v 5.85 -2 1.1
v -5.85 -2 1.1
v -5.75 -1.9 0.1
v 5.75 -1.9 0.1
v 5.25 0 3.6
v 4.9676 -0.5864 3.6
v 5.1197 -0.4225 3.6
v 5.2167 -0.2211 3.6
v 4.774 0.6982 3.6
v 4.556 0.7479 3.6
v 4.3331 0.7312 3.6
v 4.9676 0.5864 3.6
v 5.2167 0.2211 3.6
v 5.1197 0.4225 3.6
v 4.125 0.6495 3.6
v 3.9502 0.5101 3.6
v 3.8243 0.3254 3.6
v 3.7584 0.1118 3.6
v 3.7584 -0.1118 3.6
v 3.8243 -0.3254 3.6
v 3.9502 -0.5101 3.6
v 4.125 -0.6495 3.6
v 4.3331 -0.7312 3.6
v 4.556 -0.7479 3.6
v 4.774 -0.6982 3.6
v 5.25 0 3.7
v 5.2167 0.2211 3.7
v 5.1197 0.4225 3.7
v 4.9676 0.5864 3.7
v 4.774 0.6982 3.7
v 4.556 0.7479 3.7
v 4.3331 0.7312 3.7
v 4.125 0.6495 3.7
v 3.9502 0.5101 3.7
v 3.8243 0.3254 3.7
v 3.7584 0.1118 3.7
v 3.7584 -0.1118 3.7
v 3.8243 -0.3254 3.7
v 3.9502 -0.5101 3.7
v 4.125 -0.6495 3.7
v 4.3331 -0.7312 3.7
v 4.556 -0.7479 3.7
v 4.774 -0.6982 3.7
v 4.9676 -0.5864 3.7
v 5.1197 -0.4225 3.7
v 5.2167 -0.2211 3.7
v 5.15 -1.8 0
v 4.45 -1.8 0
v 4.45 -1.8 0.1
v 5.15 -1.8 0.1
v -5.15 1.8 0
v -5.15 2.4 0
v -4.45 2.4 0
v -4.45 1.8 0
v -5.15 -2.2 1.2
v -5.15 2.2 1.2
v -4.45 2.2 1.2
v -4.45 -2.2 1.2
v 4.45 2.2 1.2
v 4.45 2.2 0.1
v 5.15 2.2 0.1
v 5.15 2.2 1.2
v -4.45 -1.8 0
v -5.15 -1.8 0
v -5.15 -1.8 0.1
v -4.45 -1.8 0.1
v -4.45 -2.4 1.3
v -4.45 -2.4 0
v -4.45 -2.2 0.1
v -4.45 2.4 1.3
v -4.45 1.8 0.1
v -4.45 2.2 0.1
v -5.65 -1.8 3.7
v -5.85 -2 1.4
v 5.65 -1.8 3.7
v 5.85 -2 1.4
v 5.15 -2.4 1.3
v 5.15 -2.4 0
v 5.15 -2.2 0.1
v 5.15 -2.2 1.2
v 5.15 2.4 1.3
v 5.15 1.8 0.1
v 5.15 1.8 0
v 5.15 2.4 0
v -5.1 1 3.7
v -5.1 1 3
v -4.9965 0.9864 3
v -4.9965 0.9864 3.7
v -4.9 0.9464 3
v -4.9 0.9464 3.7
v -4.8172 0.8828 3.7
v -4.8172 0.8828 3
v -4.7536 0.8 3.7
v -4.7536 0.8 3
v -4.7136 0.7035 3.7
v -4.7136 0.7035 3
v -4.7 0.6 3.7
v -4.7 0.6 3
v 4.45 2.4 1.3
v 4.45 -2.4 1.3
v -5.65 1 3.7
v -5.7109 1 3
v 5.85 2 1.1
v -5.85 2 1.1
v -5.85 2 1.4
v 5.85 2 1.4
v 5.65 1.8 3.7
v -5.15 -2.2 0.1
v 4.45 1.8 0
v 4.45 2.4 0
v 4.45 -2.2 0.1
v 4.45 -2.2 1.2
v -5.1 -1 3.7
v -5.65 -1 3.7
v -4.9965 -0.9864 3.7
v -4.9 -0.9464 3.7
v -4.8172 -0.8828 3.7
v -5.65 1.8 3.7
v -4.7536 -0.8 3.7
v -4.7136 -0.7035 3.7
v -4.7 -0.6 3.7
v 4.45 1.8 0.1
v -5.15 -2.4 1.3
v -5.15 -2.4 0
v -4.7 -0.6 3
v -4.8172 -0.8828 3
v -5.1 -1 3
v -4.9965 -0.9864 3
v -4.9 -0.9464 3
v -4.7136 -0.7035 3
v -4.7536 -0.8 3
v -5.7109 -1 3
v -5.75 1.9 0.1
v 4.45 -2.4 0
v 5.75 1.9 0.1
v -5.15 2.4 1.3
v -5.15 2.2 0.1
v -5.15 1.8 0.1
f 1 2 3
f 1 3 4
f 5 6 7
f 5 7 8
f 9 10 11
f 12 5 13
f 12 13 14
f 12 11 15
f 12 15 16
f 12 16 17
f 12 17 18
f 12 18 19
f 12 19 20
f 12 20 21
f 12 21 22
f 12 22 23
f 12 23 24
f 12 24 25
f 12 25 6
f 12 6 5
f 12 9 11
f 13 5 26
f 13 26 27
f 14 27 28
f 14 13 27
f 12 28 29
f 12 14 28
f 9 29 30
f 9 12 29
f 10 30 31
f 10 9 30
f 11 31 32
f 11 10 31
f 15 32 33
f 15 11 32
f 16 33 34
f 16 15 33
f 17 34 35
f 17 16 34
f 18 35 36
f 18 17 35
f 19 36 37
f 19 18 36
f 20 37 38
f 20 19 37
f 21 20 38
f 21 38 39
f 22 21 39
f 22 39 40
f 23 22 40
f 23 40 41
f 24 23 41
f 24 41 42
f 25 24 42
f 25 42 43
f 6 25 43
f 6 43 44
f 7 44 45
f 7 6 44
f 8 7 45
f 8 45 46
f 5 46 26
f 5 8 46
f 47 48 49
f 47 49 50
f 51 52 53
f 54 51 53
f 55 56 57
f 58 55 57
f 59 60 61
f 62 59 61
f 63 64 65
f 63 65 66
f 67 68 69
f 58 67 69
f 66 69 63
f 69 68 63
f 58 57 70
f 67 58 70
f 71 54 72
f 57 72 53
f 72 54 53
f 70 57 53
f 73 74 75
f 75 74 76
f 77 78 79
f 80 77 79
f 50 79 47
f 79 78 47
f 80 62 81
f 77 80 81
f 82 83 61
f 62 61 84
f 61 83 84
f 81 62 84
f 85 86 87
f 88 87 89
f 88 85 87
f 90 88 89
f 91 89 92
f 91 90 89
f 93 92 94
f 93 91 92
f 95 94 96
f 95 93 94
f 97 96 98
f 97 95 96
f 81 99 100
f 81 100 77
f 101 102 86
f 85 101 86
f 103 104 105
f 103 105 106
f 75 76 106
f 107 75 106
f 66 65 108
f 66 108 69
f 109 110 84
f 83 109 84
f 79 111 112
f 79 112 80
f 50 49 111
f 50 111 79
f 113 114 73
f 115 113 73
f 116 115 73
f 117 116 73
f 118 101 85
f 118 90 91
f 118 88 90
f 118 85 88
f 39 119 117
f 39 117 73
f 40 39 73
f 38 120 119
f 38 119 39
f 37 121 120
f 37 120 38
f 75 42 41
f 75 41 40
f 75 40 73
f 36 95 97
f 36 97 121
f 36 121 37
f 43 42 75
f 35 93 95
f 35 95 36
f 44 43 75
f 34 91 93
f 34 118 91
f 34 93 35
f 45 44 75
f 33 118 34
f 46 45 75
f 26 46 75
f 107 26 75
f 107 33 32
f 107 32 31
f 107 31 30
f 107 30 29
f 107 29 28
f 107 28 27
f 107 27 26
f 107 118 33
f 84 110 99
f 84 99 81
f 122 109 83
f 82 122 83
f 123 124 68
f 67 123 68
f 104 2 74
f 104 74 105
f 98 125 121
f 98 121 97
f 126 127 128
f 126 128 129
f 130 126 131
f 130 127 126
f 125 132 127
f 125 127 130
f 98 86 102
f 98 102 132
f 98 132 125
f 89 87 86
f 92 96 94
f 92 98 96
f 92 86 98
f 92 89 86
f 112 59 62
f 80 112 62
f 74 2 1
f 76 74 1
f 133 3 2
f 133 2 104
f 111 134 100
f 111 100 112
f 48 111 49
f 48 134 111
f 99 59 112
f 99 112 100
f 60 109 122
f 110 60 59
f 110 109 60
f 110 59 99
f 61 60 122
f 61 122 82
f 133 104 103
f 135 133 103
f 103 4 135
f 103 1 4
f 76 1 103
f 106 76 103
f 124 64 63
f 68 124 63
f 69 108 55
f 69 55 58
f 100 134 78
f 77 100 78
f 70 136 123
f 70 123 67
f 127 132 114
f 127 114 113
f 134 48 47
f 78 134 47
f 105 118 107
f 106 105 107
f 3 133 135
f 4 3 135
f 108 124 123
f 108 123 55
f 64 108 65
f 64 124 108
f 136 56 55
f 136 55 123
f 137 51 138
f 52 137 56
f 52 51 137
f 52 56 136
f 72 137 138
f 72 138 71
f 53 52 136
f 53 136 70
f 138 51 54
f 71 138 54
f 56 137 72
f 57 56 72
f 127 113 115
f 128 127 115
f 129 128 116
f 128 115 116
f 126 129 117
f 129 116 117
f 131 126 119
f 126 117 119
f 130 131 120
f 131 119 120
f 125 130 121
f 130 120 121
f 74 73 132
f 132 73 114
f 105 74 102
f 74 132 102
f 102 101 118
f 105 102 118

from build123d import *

# Parameters (mm, degrees)
BOX003_W         = 2.7
BOX003_H         = 3.6
BOX003_DEPTH     = 1.1
BOX002_W         = 2.7
BOX002_H         = 4.4
BOX002_DEPTH     = 1.1
BOX_W            = 0.7
BOX_H            = 4.8
BOX_DEPTH        = 1.3
BOX005_W         = 2.7
BOX005_H         = 3.6
BOX005_DEPTH     = 1.1
BOX004_W         = 2.7
BOX004_H         = 4.4
BOX004_DEPTH     = 1.1
BOX001_W         = 0.7
BOX001_H         = 4.8
BOX001_DEPTH     = 1.3
BOX006_W         = 2
BOX006_H         = 2
BOX006_DEPTH     = 1
FILLET_R         = 0.4
FILLET001_R      = 0.4
FILLET002_R      = 0.4
CYLINDER_R       = 0.75
CYLINDER_DEPTH   = 1
SKETCH_W         = 11.7
SKETCH_H         = 4
PAD_DEPTH        = 3.6
CHAMFER_SIZE2    = 0.2
CHAMFER_SIZE     = 2.3
CHAMFER001_SIZE2 = 2.3
CHAMFER001_SIZE  = 0.2
CHAMFER002_SIZE2 = 0.2
CHAMFER002_SIZE  = 2.3
CHAMFER003_SIZE2 = 2.3
CHAMFER003_SIZE  = 0.2
CHAMFER004_SIZE2 = 0.1
CHAMFER004_SIZE  = 1
CHAMFER005_SIZE2 = 1
CHAMFER005_SIZE  = 0.1
CHAMFER006_SIZE2 = 1
CHAMFER006_SIZE  = 0.1
CHAMFER007_SIZE2 = 1
CHAMFER007_SIZE  = 0.1


with BuildPart() as kub003:
    # Box003 → Box003 (new body)
    with BuildSketch(Plane(origin=(3.45, -1.8, -0.9), x_dir=(1, 0, 0), z_dir=(0, 0, 1))):
        with Locations((1.35, 1.8)):
            Rectangle(BOX003_W, BOX003_H)
    extrude(amount=BOX003_DEPTH)


with BuildPart() as kub002:
    # Box002 → Box002 (new body)
    with BuildSketch(Plane(origin=(3.45, -2.2, 0.1), x_dir=(1, 0, 0), z_dir=(0, 0, 1))):
        with Locations((1.35, 2.2)):
            Rectangle(BOX002_W, BOX002_H)
    extrude(amount=BOX002_DEPTH)


with BuildPart() as cut001:
    # Box → Box (new body)
    with BuildSketch(Plane(origin=(4.45, -2.4, 0), x_dir=(1, 0, 0), z_dir=(0, 0, 1))):
        with Locations((0.35, 2.4)):
            Rectangle(BOX_W, BOX_H)
    extrude(amount=BOX_DEPTH)

    # Cut: cut Kub002
    add(kub002.part, mode=Mode.SUBTRACT)

    # Cut001: cut Kub003
    add(kub003.part, mode=Mode.SUBTRACT)


with BuildPart() as kub005:
    # Box005 → Box005 (new body)
    with BuildSketch(Plane(origin=(-6.55, -1.8, -0.9), x_dir=(1, 0, 0), z_dir=(0, 0, 1))):
        with Locations((1.35, 1.8)):
            Rectangle(BOX005_W, BOX005_H)
    extrude(amount=BOX005_DEPTH)


with BuildPart() as kub004:
    # Box004 → Box004 (new body)
    with BuildSketch(Plane(origin=(-5.55, -2.2, 0.1), x_dir=(1, 0, 0), z_dir=(0, 0, 1))):
        with Locations((1.35, 2.2)):
            Rectangle(BOX004_W, BOX004_H)
    extrude(amount=BOX004_DEPTH)


with BuildPart() as cut003:
    # Box001 → Box001 (new body)
    with BuildSketch(Plane(origin=(-5.15, -2.4, 0), x_dir=(1, 0, 0), z_dir=(0, 0, 1))):
        with Locations((0.35, 2.4)):
            Rectangle(BOX001_W, BOX001_H)
    extrude(amount=BOX001_DEPTH)

    # Cut002: cut Kub004
    add(kub004.part, mode=Mode.SUBTRACT)

    # Cut003: cut Kub005
    add(kub005.part, mode=Mode.SUBTRACT)


with BuildPart() as fillet002:
    # Box006 → Box006 (new body)
    with BuildSketch(Plane(origin=(5, -1, 3), x_dir=(1, 0, 0), z_dir=(0, 0, 1))):
        with Locations((1, 1)):
            Rectangle(BOX006_W, BOX006_H)
    extrude(amount=BOX006_DEPTH)

    # Fillet
    fillet_edges = [fillet002.edges().sort_by_distance(p)[0] for p in [
        (5, -1, 3.5),
    ]]
    fillet(fillet_edges, radius=FILLET_R)

    # Fillet001
    fillet001_edges = [fillet002.edges().sort_by_distance(p)[0] for p in [
        (5, 1, 3.5),
    ]]
    fillet(fillet001_edges, radius=FILLET001_R)

    # Fillet002
    fillet002_edges = [fillet002.edges().sort_by_distance(p)[0] for p in [
        (7, 1, 3.5),
        (7, -1, 3.5),
    ]]
    fillet(fillet002_edges, radius=FILLET002_R)


with BuildPart() as fillet002_1:
    # Fillet002 placement: moved
    add(fillet002.part.moved(Location((-11.7, 0, 0))))


with BuildPart() as cylinder:
    # Cylinder → Cylinder (new body)
    with BuildSketch(Plane(origin=(4.5, 0, 3.6), x_dir=(1, 0, 0), z_dir=(0, 0, 1))):
        Circle(CYLINDER_R)
    extrude(amount=CYLINDER_DEPTH)


with BuildPart() as cut005:
    # Sketch → Pad (new body)
    with BuildSketch(Plane.XY):
        Rectangle(SKETCH_W, SKETCH_H)
    extrude(amount=PAD_DEPTH)


with BuildPart() as cut005_1:
    # Body placement: moved
    add(cut005.part.moved(Location((0, 0, 0.1))))

    # Cut004: cut Cylinder
    add(cylinder.part, mode=Mode.SUBTRACT)

    # Chamfer
    chamfer_edges = [cut005_1.edges().sort_by_distance(p)[0] for p in [
        (0, 2, 3.7),
    ]]
    chamfer_side = cut005_1.faces().sort_by_distance((0, 2, 1.9))[0]
    chamfer(chamfer_edges, length=CHAMFER_SIZE, length2=CHAMFER_SIZE2, reference=chamfer_side)

    # Chamfer001
    chamfer001_edges = [cut005_1.edges().sort_by_distance(p)[0] for p in [
        (0, -2, 3.7),
    ]]
    chamfer001_side = cut005_1.faces().sort_by_distance((-0.186264, -0.104139, 3.7))[0]
    chamfer(chamfer001_edges, length=CHAMFER001_SIZE, length2=CHAMFER001_SIZE2, reference=chamfer001_side)

    # Chamfer002
    chamfer002_edges = [cut005_1.edges().sort_by_distance(p)[0] for p in [
        (-5.85, 0, 3.7),
    ]]
    chamfer002_side = cut005_1.faces().sort_by_distance((-5.85, 0, 1.865901))[0]
    chamfer(chamfer002_edges, length=CHAMFER002_SIZE, length2=CHAMFER002_SIZE2, reference=chamfer002_side)

    # Chamfer003
    chamfer003_edges = [cut005_1.edges().sort_by_distance(p)[0] for p in [
        (5.85, 0, 3.7),
    ]]
    chamfer003_side = cut005_1.faces().sort_by_distance((-0.096187, 0, 3.7))[0]
    chamfer(chamfer003_edges, length=CHAMFER003_SIZE, length2=CHAMFER003_SIZE2, reference=chamfer003_side)

    # Chamfer004
    chamfer004_edges = [cut005_1.edges().sort_by_distance(p)[0] for p in [
        (-5.85, 0, 0.1),
    ]]
    chamfer004_side = cut005_1.faces().sort_by_distance((-5.85, 0, 0.75))[0]
    chamfer(chamfer004_edges, length=CHAMFER004_SIZE, length2=CHAMFER004_SIZE2, reference=chamfer004_side)

    # Chamfer005
    chamfer005_edges = [cut005_1.edges().sort_by_distance(p)[0] for p in [
        (5.85, 0, 0.1),
    ]]
    chamfer005_side = cut005_1.faces().sort_by_distance((0.05, 0, 0.1))[0]
    chamfer(chamfer005_edges, length=CHAMFER005_SIZE, length2=CHAMFER005_SIZE2, reference=chamfer005_side)

    # Chamfer006
    chamfer006_edges = [cut005_1.edges().sort_by_distance(p)[0] for p in [
        (0, 2, 0.1),
    ]]
    chamfer006_side = cut005_1.faces().sort_by_distance((0, 0, 0.1))[0]
    chamfer(chamfer006_edges, length=CHAMFER006_SIZE, length2=CHAMFER006_SIZE2, reference=chamfer006_side)

    # Chamfer007
    chamfer007_edges = [cut005_1.edges().sort_by_distance(p)[0] for p in [
        (0, -2, 0.1),
    ]]
    chamfer007_side = cut005_1.faces().sort_by_distance((0, -0.05, 0.1))[0]
    chamfer(chamfer007_edges, length=CHAMFER007_SIZE, length2=CHAMFER007_SIZE2, reference=chamfer007_side)

    # Cut005: cut Fillet002
    add(fillet002_1.part, mode=Mode.SUBTRACT)


solid = Compound([cut001.part, cut003.part, cut005_1.part])
